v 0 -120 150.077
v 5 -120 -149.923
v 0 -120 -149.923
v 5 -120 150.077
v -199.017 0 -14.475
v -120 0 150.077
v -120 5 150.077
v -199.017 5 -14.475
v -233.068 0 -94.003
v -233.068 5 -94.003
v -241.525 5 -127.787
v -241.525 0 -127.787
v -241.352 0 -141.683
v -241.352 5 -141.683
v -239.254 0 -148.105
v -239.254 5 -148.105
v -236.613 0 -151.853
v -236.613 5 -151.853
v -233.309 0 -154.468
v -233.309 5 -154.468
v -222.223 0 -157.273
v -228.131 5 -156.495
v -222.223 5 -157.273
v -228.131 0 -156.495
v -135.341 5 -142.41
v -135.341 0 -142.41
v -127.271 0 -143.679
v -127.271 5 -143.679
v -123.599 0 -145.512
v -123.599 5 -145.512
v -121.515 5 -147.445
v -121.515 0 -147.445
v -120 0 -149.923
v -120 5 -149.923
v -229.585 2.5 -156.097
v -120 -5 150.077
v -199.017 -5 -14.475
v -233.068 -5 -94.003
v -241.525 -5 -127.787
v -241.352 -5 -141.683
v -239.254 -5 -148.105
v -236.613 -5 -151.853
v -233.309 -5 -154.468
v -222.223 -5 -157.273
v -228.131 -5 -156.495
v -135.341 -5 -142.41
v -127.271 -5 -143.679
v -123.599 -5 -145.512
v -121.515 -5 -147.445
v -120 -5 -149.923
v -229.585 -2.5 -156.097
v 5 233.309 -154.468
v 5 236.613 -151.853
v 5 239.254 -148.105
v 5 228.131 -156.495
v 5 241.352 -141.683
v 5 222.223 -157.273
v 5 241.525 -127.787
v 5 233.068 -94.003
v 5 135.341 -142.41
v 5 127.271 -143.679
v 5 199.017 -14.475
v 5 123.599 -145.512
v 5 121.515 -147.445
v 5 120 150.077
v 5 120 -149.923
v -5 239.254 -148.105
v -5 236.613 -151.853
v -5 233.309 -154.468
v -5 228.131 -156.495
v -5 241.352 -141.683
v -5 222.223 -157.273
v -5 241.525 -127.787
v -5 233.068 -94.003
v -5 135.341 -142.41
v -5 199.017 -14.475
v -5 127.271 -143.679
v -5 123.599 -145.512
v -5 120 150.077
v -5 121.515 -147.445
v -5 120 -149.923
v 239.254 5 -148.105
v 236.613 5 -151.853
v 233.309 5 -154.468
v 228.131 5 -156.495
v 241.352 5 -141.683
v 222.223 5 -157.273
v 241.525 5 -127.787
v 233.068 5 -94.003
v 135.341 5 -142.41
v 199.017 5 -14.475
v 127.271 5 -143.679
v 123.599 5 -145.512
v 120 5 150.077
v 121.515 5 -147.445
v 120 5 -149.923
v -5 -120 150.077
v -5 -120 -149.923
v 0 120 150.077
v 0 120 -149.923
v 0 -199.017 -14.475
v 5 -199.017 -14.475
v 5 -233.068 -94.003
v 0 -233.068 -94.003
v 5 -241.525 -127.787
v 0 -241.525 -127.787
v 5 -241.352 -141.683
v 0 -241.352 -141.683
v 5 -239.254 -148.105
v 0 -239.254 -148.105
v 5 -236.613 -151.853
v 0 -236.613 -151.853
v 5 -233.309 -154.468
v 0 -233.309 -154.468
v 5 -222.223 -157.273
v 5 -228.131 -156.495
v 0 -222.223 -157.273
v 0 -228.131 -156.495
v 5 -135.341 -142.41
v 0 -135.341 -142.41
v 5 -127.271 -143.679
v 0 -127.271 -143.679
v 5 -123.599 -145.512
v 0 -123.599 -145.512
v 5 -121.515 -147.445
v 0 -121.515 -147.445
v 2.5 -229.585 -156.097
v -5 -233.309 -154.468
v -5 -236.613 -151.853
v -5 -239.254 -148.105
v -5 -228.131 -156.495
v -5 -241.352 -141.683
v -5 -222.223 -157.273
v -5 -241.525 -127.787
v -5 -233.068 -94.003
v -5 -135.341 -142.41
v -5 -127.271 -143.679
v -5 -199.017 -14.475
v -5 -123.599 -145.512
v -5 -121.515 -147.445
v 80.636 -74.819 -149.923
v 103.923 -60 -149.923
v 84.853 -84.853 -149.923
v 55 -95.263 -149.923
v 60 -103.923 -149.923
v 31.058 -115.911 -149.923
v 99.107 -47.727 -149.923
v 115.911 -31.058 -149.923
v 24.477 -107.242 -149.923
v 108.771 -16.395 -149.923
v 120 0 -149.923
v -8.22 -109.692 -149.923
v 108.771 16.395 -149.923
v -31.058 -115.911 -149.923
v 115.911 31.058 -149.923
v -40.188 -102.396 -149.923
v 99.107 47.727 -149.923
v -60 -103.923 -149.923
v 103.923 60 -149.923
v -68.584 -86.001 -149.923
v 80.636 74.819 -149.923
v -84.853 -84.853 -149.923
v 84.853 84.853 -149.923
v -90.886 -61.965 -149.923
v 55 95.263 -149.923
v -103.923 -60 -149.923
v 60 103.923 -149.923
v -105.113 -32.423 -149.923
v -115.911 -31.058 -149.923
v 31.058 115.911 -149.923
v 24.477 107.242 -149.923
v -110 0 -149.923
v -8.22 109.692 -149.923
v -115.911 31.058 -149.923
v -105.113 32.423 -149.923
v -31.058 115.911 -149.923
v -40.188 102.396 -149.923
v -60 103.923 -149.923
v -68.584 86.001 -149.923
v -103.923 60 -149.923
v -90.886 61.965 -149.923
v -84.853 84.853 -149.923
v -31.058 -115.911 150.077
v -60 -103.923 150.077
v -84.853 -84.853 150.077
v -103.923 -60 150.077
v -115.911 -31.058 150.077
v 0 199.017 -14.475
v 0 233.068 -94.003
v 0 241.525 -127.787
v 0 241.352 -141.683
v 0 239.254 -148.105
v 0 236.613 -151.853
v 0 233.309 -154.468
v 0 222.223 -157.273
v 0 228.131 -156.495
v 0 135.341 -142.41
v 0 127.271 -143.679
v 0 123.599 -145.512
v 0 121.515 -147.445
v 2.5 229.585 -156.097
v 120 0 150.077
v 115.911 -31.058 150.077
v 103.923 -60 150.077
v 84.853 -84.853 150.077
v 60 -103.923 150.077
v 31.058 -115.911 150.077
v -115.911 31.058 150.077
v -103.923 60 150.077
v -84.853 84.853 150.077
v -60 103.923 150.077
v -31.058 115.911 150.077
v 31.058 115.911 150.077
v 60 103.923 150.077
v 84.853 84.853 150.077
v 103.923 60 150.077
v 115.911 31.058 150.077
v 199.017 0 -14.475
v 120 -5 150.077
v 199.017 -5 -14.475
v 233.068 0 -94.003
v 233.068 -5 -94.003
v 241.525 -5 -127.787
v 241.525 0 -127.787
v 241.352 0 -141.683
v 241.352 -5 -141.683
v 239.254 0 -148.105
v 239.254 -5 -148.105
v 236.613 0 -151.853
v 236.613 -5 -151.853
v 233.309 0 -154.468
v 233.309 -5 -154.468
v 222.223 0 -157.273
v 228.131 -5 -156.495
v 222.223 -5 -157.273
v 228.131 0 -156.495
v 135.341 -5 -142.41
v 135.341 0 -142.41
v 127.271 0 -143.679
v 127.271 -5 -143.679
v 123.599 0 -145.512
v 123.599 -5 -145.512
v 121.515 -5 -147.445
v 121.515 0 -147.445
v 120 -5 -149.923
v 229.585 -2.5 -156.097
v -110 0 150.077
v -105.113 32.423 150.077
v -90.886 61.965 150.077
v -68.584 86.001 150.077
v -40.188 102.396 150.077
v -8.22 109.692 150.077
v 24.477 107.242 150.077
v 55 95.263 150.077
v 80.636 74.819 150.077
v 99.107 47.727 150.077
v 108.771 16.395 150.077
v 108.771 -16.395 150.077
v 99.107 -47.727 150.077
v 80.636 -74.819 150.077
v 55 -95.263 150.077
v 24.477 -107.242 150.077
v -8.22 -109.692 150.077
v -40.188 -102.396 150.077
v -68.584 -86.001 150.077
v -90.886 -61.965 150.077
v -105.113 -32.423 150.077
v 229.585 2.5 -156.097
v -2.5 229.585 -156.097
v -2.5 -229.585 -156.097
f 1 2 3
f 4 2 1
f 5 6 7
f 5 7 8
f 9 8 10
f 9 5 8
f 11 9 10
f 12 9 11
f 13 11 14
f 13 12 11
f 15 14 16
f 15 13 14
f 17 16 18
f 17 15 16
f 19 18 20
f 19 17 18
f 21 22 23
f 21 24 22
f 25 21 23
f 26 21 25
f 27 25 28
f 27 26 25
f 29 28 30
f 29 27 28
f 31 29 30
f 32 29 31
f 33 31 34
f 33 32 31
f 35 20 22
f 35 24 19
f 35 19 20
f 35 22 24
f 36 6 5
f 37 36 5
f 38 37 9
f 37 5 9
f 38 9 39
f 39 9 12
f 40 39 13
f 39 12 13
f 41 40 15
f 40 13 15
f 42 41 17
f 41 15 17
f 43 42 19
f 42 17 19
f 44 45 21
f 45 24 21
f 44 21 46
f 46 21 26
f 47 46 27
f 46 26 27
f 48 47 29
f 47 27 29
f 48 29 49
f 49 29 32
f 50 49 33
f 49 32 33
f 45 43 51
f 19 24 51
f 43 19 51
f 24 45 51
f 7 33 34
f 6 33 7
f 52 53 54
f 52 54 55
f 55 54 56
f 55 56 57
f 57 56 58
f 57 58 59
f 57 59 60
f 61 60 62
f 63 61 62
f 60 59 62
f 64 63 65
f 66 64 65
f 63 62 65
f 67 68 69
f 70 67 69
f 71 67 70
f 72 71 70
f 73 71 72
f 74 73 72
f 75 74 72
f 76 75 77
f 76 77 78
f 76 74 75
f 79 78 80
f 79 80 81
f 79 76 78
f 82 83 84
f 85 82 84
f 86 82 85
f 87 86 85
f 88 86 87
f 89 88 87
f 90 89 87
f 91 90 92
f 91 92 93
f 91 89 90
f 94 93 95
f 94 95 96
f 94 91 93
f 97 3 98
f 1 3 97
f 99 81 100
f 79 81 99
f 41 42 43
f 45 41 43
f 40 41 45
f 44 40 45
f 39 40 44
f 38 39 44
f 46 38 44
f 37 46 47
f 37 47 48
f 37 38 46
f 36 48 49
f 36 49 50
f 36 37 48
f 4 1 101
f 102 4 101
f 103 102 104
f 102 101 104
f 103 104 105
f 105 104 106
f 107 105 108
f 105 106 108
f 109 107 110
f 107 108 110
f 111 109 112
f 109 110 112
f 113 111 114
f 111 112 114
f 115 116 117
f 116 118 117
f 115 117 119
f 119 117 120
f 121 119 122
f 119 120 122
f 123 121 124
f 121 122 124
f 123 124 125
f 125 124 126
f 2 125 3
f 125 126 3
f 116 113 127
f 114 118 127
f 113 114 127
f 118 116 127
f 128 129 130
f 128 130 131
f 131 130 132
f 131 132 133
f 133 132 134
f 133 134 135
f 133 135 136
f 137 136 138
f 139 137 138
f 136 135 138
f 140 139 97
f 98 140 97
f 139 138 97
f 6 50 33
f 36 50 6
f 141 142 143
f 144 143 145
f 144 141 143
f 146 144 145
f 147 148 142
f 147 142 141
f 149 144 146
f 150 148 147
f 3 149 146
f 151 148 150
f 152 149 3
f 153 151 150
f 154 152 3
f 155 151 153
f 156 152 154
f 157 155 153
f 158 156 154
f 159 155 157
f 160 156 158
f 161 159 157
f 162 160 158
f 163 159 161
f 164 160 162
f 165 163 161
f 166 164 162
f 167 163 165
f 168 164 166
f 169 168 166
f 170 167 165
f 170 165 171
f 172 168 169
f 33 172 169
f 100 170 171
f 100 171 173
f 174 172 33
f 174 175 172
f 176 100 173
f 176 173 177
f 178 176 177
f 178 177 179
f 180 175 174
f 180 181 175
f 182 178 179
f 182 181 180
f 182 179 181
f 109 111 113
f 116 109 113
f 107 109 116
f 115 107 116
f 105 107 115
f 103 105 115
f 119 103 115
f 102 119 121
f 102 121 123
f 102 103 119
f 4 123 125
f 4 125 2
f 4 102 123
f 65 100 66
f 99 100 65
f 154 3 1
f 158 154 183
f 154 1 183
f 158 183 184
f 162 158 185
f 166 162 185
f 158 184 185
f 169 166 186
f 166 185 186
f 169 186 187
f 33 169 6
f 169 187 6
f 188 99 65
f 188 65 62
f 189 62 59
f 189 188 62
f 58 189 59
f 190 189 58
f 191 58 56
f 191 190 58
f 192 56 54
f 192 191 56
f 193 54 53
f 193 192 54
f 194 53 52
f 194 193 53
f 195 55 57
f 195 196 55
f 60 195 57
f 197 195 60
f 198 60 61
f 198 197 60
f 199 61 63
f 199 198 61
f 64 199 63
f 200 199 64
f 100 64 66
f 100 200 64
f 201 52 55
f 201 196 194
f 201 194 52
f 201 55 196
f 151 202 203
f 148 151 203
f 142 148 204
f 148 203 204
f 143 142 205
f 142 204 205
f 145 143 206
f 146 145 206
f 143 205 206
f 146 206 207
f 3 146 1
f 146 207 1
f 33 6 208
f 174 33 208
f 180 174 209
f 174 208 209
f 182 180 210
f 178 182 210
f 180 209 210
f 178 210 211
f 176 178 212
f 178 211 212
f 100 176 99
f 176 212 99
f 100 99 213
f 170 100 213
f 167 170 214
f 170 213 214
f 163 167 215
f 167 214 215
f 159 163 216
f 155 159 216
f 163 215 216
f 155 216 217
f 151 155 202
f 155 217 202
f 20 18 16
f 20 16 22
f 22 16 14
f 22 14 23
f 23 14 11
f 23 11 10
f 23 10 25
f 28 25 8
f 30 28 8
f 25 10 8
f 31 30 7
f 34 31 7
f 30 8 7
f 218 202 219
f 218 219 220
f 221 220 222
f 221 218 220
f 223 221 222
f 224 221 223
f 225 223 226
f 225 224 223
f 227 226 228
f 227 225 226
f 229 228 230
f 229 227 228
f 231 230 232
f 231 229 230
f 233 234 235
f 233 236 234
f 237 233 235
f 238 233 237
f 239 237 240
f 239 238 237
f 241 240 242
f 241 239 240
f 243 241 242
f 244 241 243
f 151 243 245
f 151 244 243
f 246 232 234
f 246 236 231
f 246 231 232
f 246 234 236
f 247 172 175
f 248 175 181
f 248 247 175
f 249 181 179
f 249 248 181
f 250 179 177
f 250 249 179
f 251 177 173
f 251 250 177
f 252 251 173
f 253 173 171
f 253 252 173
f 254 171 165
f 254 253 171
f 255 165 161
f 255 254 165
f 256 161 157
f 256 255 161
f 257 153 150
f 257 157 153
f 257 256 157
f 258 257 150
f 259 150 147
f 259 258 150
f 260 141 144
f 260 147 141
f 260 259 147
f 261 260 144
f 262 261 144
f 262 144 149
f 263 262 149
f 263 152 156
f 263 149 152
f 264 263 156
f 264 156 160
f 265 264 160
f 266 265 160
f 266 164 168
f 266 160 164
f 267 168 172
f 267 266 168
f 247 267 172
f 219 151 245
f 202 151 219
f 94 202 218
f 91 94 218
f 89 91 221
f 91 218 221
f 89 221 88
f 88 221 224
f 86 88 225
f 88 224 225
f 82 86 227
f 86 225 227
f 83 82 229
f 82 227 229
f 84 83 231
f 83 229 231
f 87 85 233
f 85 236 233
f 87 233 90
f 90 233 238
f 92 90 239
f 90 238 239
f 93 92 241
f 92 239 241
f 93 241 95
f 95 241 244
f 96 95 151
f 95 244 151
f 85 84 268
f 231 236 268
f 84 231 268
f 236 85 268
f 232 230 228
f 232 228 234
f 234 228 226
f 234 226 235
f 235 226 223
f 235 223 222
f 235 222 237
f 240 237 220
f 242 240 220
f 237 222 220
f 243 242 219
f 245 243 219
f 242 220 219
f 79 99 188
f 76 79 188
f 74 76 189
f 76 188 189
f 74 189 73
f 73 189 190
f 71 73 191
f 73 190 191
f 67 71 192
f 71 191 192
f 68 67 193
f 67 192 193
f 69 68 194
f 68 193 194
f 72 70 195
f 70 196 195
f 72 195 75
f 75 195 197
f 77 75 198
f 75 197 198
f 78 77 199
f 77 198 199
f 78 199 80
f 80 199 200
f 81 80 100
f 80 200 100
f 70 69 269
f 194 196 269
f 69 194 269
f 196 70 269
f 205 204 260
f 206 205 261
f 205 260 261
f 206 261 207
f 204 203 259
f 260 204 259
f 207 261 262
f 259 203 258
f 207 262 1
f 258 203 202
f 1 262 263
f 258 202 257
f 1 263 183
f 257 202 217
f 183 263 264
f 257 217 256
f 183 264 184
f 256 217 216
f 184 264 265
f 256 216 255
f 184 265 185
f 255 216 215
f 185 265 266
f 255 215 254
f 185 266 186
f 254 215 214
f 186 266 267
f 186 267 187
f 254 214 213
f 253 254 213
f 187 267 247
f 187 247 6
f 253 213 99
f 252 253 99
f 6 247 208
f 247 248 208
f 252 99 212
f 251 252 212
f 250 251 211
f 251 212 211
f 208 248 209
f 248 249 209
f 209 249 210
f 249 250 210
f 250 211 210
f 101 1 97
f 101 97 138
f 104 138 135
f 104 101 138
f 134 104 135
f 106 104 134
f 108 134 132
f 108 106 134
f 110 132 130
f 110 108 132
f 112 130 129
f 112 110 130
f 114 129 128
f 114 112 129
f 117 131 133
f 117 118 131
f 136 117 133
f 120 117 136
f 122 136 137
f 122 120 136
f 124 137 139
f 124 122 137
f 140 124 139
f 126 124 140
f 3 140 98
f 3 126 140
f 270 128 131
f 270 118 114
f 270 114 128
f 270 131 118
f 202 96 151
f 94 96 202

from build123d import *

# Parameters (mm, degrees)
F0_W     = 10
F0_H     = 300
F2_DEPTH = 5
F3_COUNT = 4


with BuildPart() as f1:
    # F0 (on Front) → F1 (revolve)
    with BuildSketch(Plane.XZ):
        with Locations((-115, 0.0769793987)):
            Rectangle(F0_W, F0_H)
    revolve(axis=Axis((0, 0, 4.6833008528), (0, 0, -1)))

    # F0 (on Front) → F2 (join, symmetric)
    with BuildSketch(Plane.XZ):
        with BuildLine():
            Line((-120, -149.9230206013), (-120, 150.0769793987))
            add(Edge.make_bspline(
                [(-120, 150.0769793987), (-183.7929189205, 7.6976614073), (-328.5291813645, -228.687468868), (-130.0751566887, -127.0370483398), (-120, -149.9230206013)],
                knots=[0, 0, 0, 0, 0.632526096, 1, 1, 1, 1], degree=3))
        make_face()
    extrude(amount=F2_DEPTH, both=True)

    # F3: F1 ×4 about axis
    f3_axis = Axis((0, 0, 4.6833008528), (0, 0, -1))


with BuildPart() as f1_1:
    add(f1.part)
    for i in range(1, F3_COUNT):
        add(f1.part.rotate(f3_axis, i * 360 / F3_COUNT))


solid = f1_1.part
